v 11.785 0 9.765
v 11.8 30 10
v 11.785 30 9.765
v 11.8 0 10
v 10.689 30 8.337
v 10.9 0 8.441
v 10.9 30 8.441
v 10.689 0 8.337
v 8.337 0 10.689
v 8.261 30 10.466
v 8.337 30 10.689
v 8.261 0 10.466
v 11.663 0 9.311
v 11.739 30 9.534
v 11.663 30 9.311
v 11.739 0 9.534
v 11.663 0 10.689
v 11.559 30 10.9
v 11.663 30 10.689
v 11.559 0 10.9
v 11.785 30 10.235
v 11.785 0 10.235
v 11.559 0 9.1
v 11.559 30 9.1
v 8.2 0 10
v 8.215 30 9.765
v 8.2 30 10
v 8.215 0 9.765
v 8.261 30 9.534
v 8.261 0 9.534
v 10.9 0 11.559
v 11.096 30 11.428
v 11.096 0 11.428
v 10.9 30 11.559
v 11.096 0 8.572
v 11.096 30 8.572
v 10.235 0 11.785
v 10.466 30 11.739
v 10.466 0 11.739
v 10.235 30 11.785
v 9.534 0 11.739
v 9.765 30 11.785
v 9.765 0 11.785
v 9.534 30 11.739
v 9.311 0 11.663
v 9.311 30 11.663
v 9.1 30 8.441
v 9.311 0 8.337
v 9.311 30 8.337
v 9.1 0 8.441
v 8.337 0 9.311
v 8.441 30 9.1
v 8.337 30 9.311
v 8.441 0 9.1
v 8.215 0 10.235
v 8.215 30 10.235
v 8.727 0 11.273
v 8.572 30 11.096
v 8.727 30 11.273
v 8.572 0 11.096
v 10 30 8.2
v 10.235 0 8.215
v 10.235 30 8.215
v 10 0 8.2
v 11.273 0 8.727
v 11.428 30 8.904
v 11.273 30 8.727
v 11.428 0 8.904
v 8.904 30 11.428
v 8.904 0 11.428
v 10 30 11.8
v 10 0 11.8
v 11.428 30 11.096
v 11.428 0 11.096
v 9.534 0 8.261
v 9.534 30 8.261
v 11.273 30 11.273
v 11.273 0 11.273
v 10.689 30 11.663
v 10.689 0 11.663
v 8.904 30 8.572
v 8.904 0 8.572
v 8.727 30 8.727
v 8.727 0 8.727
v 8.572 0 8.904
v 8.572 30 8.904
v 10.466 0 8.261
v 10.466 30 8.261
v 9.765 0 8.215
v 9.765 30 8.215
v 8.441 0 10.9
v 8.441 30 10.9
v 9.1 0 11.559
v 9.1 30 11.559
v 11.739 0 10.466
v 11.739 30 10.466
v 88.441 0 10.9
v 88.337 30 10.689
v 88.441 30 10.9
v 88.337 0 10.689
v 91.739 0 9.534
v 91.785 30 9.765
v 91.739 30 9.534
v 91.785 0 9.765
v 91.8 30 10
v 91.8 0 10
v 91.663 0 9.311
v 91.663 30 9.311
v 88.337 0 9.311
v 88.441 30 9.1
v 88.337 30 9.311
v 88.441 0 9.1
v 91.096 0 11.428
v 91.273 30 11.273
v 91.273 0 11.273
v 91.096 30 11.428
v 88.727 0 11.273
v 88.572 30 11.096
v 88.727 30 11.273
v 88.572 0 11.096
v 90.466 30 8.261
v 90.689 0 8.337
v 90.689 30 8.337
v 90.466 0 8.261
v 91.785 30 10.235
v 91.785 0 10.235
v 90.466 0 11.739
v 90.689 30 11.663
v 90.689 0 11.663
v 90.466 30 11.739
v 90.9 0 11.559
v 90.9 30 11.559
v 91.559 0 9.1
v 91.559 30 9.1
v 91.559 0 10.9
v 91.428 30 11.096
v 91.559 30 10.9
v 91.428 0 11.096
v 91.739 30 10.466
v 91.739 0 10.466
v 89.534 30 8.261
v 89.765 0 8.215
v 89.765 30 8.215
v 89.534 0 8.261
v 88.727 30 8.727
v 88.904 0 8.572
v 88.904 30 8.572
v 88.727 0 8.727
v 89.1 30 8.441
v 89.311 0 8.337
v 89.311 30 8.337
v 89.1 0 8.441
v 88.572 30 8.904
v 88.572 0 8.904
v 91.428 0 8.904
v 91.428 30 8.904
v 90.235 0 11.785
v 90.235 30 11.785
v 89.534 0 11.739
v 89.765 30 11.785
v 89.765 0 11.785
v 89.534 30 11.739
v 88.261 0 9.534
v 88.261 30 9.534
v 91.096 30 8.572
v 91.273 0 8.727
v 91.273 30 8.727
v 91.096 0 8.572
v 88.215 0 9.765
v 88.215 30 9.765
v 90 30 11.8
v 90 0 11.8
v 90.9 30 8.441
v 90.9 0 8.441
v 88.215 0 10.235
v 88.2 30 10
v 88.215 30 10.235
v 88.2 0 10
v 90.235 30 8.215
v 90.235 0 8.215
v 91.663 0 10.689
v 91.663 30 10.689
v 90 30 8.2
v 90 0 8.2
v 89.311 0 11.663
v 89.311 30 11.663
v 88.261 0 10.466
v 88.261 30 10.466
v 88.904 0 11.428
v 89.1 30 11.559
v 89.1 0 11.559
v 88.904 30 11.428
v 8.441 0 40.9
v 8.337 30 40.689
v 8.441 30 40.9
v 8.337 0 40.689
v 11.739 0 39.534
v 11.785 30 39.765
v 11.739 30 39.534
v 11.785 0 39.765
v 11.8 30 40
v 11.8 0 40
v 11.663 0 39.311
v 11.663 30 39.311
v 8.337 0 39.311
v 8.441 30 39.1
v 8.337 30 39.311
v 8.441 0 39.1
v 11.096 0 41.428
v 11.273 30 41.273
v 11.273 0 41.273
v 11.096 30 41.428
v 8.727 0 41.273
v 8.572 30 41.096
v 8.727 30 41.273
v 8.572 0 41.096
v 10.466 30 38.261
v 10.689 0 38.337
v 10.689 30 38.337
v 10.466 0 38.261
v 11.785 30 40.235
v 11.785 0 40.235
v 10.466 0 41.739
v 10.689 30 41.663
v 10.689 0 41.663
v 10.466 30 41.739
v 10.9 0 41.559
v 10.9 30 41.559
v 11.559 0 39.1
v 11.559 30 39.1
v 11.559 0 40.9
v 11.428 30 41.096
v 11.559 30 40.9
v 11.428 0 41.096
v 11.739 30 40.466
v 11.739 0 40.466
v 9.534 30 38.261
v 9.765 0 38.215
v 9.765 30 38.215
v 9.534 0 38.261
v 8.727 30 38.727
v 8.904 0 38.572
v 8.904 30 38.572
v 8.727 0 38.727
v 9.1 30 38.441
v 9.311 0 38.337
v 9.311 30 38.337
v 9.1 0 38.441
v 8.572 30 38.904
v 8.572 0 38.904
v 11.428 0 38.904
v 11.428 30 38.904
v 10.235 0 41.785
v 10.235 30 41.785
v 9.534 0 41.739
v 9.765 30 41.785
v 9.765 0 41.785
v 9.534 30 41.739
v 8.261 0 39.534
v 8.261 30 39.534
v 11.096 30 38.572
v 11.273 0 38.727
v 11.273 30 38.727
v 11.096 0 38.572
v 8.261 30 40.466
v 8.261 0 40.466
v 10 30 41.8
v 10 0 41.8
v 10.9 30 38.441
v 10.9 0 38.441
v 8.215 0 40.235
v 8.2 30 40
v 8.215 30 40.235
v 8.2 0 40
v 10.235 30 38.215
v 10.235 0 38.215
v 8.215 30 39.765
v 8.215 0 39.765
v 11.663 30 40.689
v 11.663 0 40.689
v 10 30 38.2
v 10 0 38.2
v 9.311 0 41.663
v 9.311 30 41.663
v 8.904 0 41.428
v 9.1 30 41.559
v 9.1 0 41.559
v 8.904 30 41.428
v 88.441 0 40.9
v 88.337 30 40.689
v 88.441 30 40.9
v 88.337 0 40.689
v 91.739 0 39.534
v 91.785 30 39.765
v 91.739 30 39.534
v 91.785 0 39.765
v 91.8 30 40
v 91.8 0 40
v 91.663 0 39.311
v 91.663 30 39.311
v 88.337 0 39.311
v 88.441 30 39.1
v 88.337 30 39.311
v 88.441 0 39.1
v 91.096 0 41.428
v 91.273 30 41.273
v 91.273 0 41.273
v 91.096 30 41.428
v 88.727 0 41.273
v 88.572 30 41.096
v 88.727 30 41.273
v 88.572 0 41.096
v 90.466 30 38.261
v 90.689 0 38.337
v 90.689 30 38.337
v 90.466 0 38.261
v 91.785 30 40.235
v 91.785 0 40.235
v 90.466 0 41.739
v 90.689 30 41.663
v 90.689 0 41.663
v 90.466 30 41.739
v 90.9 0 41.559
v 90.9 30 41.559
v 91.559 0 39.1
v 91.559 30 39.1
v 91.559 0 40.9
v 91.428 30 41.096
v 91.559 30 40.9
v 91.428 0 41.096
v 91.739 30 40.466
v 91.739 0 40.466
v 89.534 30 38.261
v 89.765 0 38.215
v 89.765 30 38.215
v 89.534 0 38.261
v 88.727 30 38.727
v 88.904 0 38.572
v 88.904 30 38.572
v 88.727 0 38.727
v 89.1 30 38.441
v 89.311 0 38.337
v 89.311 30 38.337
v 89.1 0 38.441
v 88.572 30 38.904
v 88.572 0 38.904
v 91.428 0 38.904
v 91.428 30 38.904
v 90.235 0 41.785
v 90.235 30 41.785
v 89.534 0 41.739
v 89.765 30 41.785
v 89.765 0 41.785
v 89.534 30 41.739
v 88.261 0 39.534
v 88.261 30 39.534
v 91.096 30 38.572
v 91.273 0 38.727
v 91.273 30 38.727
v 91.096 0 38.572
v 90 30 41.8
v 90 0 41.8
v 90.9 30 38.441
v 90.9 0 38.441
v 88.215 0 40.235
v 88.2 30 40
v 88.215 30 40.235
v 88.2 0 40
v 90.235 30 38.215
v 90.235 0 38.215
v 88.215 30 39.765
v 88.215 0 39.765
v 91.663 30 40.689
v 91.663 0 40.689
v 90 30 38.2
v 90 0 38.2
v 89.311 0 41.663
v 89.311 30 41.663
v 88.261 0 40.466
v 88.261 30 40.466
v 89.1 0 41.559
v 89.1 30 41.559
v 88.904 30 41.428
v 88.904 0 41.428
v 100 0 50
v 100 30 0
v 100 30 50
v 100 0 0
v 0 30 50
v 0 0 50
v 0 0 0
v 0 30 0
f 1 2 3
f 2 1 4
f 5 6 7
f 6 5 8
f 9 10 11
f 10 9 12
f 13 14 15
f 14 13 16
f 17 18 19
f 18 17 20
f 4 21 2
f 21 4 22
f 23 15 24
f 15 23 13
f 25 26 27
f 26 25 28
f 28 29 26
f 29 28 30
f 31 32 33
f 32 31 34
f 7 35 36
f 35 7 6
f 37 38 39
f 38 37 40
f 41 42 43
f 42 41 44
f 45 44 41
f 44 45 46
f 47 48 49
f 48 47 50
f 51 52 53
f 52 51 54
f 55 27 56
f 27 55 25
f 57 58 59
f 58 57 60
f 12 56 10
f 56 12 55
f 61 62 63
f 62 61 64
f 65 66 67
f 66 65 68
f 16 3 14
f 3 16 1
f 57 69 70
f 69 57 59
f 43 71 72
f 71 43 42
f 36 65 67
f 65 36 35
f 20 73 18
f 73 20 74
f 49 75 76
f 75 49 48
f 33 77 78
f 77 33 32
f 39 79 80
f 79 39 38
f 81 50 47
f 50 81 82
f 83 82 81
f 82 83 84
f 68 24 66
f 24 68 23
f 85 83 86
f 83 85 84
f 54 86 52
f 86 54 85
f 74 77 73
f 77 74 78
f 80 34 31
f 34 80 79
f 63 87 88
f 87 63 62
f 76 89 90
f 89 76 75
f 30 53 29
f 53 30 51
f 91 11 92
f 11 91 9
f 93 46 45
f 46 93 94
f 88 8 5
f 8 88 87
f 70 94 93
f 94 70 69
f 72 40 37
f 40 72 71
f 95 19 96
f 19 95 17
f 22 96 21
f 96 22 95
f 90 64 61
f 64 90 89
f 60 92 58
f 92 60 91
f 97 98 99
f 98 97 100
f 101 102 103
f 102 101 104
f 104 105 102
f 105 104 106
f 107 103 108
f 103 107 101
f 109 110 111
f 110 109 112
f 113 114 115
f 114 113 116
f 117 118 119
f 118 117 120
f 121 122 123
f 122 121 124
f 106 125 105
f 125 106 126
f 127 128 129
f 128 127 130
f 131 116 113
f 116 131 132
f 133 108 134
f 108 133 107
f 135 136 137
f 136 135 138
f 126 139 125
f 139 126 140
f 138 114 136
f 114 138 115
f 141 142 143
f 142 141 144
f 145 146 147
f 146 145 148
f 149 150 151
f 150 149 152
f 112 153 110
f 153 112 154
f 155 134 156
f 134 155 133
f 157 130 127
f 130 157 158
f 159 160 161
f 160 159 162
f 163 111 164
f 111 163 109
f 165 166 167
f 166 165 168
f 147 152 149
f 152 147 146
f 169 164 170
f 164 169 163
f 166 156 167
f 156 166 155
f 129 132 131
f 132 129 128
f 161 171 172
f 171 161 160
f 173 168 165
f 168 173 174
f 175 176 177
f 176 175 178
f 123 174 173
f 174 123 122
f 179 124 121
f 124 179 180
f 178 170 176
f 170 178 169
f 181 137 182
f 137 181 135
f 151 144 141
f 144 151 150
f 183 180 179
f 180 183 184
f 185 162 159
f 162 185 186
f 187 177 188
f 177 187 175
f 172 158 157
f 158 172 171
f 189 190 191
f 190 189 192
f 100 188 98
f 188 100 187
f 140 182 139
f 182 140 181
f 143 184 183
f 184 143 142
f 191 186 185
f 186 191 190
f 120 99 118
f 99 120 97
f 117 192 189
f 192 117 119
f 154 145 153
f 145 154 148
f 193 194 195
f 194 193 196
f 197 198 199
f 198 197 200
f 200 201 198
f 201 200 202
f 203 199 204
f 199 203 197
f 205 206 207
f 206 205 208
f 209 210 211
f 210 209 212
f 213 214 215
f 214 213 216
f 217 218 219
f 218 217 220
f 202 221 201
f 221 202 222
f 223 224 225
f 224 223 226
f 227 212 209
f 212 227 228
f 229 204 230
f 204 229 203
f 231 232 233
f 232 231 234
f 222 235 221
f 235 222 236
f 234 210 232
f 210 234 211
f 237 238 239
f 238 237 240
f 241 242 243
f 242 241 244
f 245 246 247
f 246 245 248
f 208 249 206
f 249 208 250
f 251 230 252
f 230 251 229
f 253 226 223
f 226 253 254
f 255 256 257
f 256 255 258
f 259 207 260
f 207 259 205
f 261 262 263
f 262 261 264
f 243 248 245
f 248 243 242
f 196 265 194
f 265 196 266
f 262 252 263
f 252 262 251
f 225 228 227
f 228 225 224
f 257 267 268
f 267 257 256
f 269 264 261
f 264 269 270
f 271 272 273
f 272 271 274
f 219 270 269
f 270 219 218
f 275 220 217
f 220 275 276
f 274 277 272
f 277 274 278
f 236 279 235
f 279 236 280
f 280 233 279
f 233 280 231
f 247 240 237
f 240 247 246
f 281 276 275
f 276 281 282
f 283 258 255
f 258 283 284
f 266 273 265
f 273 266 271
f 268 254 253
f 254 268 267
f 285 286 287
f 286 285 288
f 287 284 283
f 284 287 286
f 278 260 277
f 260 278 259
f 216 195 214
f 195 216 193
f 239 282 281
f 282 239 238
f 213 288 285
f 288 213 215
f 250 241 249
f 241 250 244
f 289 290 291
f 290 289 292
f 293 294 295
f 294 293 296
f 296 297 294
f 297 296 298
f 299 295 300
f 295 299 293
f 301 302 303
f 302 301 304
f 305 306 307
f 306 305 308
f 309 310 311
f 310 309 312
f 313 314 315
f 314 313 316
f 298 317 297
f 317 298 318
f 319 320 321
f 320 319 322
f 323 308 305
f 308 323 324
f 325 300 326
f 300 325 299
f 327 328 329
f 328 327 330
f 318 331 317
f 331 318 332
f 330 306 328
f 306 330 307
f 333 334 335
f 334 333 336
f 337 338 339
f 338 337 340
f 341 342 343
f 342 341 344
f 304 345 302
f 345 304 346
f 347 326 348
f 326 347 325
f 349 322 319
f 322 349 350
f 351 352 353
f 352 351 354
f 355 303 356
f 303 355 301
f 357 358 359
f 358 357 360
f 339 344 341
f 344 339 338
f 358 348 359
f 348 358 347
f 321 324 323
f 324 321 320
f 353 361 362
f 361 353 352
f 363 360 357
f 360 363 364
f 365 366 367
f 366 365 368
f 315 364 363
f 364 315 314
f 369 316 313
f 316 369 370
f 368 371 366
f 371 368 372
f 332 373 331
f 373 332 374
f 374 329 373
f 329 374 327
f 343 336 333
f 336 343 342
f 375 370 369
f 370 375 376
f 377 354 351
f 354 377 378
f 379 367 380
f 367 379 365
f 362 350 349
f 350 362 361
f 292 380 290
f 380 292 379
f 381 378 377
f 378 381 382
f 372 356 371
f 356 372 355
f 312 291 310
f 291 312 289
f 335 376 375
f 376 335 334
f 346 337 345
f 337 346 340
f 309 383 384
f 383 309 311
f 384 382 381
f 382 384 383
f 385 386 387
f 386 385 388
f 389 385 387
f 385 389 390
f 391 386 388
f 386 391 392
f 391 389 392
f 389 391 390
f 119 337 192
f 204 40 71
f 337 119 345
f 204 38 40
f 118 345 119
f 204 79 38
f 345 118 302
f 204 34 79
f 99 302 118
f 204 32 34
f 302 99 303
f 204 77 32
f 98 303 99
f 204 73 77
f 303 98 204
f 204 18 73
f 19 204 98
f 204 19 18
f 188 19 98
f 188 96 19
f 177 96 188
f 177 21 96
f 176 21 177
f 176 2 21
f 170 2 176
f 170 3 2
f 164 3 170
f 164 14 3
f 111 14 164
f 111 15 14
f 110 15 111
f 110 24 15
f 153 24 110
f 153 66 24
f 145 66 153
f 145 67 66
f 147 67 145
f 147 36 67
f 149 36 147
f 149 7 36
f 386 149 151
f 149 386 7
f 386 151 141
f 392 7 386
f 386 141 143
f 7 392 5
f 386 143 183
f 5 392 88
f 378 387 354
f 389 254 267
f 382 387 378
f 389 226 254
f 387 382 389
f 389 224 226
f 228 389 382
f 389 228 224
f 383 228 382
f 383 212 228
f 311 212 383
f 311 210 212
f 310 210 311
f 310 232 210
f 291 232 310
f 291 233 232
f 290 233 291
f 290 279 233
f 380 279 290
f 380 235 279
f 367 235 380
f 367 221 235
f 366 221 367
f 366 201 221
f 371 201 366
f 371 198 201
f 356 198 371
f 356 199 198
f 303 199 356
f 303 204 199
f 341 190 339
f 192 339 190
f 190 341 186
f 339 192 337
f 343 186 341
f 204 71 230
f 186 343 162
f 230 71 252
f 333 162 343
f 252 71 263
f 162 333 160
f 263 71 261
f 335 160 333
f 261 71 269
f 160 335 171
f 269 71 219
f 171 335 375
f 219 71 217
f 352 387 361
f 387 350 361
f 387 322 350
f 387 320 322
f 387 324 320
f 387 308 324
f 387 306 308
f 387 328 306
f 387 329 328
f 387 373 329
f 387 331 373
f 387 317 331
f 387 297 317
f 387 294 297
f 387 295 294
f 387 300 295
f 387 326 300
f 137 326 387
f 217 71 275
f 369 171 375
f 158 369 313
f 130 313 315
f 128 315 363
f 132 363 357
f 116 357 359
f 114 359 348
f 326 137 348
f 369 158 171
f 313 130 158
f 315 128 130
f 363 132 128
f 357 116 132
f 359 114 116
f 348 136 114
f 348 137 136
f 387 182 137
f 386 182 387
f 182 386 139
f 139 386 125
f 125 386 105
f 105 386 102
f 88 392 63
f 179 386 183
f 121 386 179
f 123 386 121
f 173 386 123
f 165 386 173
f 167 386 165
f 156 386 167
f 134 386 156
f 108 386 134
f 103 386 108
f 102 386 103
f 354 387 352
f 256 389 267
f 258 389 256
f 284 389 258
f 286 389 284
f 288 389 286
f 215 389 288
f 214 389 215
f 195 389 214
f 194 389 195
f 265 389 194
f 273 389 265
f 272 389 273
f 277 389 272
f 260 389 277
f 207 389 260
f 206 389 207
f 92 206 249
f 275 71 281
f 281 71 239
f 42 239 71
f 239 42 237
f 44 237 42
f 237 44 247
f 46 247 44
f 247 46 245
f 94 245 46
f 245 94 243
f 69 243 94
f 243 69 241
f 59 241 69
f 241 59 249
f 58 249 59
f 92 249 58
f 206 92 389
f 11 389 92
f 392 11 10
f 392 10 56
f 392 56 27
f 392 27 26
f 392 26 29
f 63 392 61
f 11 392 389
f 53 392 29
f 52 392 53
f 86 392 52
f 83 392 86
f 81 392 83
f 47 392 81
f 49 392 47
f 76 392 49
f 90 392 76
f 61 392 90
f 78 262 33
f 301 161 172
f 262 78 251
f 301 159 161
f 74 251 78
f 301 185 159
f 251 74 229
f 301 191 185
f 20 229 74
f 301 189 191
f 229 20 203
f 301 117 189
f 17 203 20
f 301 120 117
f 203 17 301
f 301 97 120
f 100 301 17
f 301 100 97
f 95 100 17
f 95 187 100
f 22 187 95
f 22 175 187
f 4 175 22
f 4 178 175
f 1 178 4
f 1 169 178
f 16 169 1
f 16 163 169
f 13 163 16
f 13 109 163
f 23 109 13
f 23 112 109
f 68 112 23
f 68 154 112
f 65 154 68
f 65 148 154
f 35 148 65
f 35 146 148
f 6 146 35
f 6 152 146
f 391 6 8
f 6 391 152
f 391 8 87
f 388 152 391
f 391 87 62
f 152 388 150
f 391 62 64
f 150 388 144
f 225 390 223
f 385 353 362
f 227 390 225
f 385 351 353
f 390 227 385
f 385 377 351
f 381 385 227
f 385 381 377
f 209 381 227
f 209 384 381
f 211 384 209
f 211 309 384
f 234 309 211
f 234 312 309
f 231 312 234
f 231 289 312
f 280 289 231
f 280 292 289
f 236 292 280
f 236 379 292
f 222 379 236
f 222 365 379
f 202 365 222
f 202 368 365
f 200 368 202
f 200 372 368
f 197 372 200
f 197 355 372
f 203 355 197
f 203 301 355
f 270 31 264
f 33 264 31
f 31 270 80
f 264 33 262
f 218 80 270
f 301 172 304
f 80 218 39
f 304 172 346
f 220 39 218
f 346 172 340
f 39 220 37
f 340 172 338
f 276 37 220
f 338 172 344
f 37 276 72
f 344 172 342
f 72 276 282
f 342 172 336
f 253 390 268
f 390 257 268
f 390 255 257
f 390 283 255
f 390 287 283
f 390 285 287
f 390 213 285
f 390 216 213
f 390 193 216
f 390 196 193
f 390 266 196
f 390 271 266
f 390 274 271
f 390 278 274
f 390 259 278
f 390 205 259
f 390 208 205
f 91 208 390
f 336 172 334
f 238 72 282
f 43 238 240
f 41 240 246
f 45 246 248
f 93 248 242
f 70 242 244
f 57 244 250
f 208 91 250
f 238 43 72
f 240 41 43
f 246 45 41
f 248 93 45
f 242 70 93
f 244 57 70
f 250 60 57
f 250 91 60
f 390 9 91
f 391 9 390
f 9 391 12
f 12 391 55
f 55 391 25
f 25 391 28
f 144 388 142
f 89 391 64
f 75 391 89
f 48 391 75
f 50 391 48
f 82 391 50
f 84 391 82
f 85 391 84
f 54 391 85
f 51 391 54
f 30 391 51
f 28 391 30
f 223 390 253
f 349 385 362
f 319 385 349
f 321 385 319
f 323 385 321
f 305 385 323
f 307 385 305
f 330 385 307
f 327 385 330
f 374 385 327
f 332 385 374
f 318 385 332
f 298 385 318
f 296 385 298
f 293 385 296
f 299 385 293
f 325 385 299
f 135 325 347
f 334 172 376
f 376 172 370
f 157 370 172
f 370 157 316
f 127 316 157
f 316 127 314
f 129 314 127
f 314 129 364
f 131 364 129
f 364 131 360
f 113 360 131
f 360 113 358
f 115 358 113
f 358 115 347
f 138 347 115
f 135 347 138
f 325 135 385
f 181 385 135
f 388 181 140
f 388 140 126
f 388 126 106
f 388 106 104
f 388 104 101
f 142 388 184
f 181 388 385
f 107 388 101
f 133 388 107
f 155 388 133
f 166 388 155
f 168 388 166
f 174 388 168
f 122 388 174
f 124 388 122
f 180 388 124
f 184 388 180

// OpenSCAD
// <Short description of the part>
//
// Dimensions: <link or "measured" or "N/A">
// Units: mm
// Print orientation:
// - <part-name>: <e.g. "flat on rear face", "rear side down">
//
// Author: <Name> (<email>)
// License: MIT License (https://opensource.org/licenses/MIT)

// -----------------------------------------------------------------------
// Global constants
// -----------------------------------------------------------------------
eps           = 0.01; // Boolean overlap to avoid co-planar faces in mm
fit_tolerance = 0.2;  // General assembly clearance in mm
rounded_fn    = 96;   // Facet count for outer rounded contours

// -----------------------------------------------------------------------
// Preview / export selector
// -----------------------------------------------------------------------
// Possible values: assembly | <part1> | <part2> | …
part = "assembly";

// -----------------------------------------------------------------------
// Parameters – <ComponentA> (replace with real component name)
// -----------------------------------------------------------------------
comp_a_width  = 100; // Width of ComponentA in mm
comp_a_height = 50;  // Height of ComponentA in mm
comp_a_depth  = 30;  // Depth of ComponentA in mm

// -----------------------------------------------------------------------
// Parameters – <ComponentB>
// -----------------------------------------------------------------------
comp_b_diameter = 3.2; // Diameter of ComponentB mounting holes in mm
comp_b_count    = 4;   // Number of mounting holes

// -----------------------------------------------------------------------
// Derived dimensions (never hard-code these as literals in geometry)
// -----------------------------------------------------------------------
comp_a_half_width  = comp_a_width  / 2; // Half-width for centering in mm
comp_a_half_height = comp_a_height / 2; // Half-height for centering in mm

// -----------------------------------------------------------------------
// Pure helper functions
// -----------------------------------------------------------------------

/// Returns the offset needed to center an inner dimension within an outer one.
function centered_offset(outer, inner) = (outer - inner) / 2;

/// Returns a clearance-hole diameter for a given nominal bolt diameter.
function clearance_hole_d(nominal) = nominal + 0.4;

// -----------------------------------------------------------------------
// Reusable geometry modules
// -----------------------------------------------------------------------

/// Rounded rectangular 2-D profile in the XZ plane.
/// \param width   Extent in X in mm
/// \param height  Extent in Z in mm
/// \param radius  Outer corner radius in mm (0 = sharp)
module rounded_profile_xz(width, height, radius)
{
    $fn = rounded_fn;

    if (radius > 0)
    {
        translate([radius, radius])
            offset(r=radius)
                square([width - 2 * radius, height - 2 * radius]);
    }
    else
    {
        square([width, height]);
    }
}

/// Solid box with rounded XZ corners, extruded along Y.
/// \param size_xyz  [width, depth, height] in mm
/// \param radius    Corner radius in mm
module rounded_cube_xz(size_xyz, radius)
{
    translate([0, size_xyz[1], 0])
        rotate([90, 0, 0])
            linear_extrude(height=size_xyz[1])
                rounded_profile_xz(size_xyz[0], size_xyz[2], radius);
}

/// Vertical cylinder cutout positioned by XZ coords, drilled in +Y direction.
/// \param x_pos    Center X in mm
/// \param z_pos    Center Z in mm
/// \param diameter Hole diameter in mm
/// \param depth    Hole depth in mm
module hole_y(x_pos, z_pos, diameter, depth)
{
    translate([x_pos, -eps, z_pos])
        rotate([-90, 0, 0])
            cylinder(d=diameter, h=depth + 2 * eps, $fn=48);
}

// -----------------------------------------------------------------------
// Top-level part modules
// -----------------------------------------------------------------------

module part_a()
{
    difference()
    {
        // Outer shell
        cube([comp_a_width, comp_a_depth, comp_a_height]);

        // Example hole pattern
        for (i = [0 : comp_b_count - 1])
        {
            x = (i % 2 == 0) ? 10 : comp_a_width - 10;
            z = (i < 2)      ? 10 : comp_a_height - 10;
            hole_y(x, z, clearance_hole_d(comp_b_diameter), comp_a_depth);
        }
    }
}

module assembly()
{
    part_a();
    // translate([…]) part_b();
}

// -----------------------------------------------------------------------
// Dispatcher
// -----------------------------------------------------------------------
if      (part == "assembly") { assembly(); }
else if (part == "part_a")   { part_a();   }
else
{
    echo(str("Unknown part: ", part));
}
